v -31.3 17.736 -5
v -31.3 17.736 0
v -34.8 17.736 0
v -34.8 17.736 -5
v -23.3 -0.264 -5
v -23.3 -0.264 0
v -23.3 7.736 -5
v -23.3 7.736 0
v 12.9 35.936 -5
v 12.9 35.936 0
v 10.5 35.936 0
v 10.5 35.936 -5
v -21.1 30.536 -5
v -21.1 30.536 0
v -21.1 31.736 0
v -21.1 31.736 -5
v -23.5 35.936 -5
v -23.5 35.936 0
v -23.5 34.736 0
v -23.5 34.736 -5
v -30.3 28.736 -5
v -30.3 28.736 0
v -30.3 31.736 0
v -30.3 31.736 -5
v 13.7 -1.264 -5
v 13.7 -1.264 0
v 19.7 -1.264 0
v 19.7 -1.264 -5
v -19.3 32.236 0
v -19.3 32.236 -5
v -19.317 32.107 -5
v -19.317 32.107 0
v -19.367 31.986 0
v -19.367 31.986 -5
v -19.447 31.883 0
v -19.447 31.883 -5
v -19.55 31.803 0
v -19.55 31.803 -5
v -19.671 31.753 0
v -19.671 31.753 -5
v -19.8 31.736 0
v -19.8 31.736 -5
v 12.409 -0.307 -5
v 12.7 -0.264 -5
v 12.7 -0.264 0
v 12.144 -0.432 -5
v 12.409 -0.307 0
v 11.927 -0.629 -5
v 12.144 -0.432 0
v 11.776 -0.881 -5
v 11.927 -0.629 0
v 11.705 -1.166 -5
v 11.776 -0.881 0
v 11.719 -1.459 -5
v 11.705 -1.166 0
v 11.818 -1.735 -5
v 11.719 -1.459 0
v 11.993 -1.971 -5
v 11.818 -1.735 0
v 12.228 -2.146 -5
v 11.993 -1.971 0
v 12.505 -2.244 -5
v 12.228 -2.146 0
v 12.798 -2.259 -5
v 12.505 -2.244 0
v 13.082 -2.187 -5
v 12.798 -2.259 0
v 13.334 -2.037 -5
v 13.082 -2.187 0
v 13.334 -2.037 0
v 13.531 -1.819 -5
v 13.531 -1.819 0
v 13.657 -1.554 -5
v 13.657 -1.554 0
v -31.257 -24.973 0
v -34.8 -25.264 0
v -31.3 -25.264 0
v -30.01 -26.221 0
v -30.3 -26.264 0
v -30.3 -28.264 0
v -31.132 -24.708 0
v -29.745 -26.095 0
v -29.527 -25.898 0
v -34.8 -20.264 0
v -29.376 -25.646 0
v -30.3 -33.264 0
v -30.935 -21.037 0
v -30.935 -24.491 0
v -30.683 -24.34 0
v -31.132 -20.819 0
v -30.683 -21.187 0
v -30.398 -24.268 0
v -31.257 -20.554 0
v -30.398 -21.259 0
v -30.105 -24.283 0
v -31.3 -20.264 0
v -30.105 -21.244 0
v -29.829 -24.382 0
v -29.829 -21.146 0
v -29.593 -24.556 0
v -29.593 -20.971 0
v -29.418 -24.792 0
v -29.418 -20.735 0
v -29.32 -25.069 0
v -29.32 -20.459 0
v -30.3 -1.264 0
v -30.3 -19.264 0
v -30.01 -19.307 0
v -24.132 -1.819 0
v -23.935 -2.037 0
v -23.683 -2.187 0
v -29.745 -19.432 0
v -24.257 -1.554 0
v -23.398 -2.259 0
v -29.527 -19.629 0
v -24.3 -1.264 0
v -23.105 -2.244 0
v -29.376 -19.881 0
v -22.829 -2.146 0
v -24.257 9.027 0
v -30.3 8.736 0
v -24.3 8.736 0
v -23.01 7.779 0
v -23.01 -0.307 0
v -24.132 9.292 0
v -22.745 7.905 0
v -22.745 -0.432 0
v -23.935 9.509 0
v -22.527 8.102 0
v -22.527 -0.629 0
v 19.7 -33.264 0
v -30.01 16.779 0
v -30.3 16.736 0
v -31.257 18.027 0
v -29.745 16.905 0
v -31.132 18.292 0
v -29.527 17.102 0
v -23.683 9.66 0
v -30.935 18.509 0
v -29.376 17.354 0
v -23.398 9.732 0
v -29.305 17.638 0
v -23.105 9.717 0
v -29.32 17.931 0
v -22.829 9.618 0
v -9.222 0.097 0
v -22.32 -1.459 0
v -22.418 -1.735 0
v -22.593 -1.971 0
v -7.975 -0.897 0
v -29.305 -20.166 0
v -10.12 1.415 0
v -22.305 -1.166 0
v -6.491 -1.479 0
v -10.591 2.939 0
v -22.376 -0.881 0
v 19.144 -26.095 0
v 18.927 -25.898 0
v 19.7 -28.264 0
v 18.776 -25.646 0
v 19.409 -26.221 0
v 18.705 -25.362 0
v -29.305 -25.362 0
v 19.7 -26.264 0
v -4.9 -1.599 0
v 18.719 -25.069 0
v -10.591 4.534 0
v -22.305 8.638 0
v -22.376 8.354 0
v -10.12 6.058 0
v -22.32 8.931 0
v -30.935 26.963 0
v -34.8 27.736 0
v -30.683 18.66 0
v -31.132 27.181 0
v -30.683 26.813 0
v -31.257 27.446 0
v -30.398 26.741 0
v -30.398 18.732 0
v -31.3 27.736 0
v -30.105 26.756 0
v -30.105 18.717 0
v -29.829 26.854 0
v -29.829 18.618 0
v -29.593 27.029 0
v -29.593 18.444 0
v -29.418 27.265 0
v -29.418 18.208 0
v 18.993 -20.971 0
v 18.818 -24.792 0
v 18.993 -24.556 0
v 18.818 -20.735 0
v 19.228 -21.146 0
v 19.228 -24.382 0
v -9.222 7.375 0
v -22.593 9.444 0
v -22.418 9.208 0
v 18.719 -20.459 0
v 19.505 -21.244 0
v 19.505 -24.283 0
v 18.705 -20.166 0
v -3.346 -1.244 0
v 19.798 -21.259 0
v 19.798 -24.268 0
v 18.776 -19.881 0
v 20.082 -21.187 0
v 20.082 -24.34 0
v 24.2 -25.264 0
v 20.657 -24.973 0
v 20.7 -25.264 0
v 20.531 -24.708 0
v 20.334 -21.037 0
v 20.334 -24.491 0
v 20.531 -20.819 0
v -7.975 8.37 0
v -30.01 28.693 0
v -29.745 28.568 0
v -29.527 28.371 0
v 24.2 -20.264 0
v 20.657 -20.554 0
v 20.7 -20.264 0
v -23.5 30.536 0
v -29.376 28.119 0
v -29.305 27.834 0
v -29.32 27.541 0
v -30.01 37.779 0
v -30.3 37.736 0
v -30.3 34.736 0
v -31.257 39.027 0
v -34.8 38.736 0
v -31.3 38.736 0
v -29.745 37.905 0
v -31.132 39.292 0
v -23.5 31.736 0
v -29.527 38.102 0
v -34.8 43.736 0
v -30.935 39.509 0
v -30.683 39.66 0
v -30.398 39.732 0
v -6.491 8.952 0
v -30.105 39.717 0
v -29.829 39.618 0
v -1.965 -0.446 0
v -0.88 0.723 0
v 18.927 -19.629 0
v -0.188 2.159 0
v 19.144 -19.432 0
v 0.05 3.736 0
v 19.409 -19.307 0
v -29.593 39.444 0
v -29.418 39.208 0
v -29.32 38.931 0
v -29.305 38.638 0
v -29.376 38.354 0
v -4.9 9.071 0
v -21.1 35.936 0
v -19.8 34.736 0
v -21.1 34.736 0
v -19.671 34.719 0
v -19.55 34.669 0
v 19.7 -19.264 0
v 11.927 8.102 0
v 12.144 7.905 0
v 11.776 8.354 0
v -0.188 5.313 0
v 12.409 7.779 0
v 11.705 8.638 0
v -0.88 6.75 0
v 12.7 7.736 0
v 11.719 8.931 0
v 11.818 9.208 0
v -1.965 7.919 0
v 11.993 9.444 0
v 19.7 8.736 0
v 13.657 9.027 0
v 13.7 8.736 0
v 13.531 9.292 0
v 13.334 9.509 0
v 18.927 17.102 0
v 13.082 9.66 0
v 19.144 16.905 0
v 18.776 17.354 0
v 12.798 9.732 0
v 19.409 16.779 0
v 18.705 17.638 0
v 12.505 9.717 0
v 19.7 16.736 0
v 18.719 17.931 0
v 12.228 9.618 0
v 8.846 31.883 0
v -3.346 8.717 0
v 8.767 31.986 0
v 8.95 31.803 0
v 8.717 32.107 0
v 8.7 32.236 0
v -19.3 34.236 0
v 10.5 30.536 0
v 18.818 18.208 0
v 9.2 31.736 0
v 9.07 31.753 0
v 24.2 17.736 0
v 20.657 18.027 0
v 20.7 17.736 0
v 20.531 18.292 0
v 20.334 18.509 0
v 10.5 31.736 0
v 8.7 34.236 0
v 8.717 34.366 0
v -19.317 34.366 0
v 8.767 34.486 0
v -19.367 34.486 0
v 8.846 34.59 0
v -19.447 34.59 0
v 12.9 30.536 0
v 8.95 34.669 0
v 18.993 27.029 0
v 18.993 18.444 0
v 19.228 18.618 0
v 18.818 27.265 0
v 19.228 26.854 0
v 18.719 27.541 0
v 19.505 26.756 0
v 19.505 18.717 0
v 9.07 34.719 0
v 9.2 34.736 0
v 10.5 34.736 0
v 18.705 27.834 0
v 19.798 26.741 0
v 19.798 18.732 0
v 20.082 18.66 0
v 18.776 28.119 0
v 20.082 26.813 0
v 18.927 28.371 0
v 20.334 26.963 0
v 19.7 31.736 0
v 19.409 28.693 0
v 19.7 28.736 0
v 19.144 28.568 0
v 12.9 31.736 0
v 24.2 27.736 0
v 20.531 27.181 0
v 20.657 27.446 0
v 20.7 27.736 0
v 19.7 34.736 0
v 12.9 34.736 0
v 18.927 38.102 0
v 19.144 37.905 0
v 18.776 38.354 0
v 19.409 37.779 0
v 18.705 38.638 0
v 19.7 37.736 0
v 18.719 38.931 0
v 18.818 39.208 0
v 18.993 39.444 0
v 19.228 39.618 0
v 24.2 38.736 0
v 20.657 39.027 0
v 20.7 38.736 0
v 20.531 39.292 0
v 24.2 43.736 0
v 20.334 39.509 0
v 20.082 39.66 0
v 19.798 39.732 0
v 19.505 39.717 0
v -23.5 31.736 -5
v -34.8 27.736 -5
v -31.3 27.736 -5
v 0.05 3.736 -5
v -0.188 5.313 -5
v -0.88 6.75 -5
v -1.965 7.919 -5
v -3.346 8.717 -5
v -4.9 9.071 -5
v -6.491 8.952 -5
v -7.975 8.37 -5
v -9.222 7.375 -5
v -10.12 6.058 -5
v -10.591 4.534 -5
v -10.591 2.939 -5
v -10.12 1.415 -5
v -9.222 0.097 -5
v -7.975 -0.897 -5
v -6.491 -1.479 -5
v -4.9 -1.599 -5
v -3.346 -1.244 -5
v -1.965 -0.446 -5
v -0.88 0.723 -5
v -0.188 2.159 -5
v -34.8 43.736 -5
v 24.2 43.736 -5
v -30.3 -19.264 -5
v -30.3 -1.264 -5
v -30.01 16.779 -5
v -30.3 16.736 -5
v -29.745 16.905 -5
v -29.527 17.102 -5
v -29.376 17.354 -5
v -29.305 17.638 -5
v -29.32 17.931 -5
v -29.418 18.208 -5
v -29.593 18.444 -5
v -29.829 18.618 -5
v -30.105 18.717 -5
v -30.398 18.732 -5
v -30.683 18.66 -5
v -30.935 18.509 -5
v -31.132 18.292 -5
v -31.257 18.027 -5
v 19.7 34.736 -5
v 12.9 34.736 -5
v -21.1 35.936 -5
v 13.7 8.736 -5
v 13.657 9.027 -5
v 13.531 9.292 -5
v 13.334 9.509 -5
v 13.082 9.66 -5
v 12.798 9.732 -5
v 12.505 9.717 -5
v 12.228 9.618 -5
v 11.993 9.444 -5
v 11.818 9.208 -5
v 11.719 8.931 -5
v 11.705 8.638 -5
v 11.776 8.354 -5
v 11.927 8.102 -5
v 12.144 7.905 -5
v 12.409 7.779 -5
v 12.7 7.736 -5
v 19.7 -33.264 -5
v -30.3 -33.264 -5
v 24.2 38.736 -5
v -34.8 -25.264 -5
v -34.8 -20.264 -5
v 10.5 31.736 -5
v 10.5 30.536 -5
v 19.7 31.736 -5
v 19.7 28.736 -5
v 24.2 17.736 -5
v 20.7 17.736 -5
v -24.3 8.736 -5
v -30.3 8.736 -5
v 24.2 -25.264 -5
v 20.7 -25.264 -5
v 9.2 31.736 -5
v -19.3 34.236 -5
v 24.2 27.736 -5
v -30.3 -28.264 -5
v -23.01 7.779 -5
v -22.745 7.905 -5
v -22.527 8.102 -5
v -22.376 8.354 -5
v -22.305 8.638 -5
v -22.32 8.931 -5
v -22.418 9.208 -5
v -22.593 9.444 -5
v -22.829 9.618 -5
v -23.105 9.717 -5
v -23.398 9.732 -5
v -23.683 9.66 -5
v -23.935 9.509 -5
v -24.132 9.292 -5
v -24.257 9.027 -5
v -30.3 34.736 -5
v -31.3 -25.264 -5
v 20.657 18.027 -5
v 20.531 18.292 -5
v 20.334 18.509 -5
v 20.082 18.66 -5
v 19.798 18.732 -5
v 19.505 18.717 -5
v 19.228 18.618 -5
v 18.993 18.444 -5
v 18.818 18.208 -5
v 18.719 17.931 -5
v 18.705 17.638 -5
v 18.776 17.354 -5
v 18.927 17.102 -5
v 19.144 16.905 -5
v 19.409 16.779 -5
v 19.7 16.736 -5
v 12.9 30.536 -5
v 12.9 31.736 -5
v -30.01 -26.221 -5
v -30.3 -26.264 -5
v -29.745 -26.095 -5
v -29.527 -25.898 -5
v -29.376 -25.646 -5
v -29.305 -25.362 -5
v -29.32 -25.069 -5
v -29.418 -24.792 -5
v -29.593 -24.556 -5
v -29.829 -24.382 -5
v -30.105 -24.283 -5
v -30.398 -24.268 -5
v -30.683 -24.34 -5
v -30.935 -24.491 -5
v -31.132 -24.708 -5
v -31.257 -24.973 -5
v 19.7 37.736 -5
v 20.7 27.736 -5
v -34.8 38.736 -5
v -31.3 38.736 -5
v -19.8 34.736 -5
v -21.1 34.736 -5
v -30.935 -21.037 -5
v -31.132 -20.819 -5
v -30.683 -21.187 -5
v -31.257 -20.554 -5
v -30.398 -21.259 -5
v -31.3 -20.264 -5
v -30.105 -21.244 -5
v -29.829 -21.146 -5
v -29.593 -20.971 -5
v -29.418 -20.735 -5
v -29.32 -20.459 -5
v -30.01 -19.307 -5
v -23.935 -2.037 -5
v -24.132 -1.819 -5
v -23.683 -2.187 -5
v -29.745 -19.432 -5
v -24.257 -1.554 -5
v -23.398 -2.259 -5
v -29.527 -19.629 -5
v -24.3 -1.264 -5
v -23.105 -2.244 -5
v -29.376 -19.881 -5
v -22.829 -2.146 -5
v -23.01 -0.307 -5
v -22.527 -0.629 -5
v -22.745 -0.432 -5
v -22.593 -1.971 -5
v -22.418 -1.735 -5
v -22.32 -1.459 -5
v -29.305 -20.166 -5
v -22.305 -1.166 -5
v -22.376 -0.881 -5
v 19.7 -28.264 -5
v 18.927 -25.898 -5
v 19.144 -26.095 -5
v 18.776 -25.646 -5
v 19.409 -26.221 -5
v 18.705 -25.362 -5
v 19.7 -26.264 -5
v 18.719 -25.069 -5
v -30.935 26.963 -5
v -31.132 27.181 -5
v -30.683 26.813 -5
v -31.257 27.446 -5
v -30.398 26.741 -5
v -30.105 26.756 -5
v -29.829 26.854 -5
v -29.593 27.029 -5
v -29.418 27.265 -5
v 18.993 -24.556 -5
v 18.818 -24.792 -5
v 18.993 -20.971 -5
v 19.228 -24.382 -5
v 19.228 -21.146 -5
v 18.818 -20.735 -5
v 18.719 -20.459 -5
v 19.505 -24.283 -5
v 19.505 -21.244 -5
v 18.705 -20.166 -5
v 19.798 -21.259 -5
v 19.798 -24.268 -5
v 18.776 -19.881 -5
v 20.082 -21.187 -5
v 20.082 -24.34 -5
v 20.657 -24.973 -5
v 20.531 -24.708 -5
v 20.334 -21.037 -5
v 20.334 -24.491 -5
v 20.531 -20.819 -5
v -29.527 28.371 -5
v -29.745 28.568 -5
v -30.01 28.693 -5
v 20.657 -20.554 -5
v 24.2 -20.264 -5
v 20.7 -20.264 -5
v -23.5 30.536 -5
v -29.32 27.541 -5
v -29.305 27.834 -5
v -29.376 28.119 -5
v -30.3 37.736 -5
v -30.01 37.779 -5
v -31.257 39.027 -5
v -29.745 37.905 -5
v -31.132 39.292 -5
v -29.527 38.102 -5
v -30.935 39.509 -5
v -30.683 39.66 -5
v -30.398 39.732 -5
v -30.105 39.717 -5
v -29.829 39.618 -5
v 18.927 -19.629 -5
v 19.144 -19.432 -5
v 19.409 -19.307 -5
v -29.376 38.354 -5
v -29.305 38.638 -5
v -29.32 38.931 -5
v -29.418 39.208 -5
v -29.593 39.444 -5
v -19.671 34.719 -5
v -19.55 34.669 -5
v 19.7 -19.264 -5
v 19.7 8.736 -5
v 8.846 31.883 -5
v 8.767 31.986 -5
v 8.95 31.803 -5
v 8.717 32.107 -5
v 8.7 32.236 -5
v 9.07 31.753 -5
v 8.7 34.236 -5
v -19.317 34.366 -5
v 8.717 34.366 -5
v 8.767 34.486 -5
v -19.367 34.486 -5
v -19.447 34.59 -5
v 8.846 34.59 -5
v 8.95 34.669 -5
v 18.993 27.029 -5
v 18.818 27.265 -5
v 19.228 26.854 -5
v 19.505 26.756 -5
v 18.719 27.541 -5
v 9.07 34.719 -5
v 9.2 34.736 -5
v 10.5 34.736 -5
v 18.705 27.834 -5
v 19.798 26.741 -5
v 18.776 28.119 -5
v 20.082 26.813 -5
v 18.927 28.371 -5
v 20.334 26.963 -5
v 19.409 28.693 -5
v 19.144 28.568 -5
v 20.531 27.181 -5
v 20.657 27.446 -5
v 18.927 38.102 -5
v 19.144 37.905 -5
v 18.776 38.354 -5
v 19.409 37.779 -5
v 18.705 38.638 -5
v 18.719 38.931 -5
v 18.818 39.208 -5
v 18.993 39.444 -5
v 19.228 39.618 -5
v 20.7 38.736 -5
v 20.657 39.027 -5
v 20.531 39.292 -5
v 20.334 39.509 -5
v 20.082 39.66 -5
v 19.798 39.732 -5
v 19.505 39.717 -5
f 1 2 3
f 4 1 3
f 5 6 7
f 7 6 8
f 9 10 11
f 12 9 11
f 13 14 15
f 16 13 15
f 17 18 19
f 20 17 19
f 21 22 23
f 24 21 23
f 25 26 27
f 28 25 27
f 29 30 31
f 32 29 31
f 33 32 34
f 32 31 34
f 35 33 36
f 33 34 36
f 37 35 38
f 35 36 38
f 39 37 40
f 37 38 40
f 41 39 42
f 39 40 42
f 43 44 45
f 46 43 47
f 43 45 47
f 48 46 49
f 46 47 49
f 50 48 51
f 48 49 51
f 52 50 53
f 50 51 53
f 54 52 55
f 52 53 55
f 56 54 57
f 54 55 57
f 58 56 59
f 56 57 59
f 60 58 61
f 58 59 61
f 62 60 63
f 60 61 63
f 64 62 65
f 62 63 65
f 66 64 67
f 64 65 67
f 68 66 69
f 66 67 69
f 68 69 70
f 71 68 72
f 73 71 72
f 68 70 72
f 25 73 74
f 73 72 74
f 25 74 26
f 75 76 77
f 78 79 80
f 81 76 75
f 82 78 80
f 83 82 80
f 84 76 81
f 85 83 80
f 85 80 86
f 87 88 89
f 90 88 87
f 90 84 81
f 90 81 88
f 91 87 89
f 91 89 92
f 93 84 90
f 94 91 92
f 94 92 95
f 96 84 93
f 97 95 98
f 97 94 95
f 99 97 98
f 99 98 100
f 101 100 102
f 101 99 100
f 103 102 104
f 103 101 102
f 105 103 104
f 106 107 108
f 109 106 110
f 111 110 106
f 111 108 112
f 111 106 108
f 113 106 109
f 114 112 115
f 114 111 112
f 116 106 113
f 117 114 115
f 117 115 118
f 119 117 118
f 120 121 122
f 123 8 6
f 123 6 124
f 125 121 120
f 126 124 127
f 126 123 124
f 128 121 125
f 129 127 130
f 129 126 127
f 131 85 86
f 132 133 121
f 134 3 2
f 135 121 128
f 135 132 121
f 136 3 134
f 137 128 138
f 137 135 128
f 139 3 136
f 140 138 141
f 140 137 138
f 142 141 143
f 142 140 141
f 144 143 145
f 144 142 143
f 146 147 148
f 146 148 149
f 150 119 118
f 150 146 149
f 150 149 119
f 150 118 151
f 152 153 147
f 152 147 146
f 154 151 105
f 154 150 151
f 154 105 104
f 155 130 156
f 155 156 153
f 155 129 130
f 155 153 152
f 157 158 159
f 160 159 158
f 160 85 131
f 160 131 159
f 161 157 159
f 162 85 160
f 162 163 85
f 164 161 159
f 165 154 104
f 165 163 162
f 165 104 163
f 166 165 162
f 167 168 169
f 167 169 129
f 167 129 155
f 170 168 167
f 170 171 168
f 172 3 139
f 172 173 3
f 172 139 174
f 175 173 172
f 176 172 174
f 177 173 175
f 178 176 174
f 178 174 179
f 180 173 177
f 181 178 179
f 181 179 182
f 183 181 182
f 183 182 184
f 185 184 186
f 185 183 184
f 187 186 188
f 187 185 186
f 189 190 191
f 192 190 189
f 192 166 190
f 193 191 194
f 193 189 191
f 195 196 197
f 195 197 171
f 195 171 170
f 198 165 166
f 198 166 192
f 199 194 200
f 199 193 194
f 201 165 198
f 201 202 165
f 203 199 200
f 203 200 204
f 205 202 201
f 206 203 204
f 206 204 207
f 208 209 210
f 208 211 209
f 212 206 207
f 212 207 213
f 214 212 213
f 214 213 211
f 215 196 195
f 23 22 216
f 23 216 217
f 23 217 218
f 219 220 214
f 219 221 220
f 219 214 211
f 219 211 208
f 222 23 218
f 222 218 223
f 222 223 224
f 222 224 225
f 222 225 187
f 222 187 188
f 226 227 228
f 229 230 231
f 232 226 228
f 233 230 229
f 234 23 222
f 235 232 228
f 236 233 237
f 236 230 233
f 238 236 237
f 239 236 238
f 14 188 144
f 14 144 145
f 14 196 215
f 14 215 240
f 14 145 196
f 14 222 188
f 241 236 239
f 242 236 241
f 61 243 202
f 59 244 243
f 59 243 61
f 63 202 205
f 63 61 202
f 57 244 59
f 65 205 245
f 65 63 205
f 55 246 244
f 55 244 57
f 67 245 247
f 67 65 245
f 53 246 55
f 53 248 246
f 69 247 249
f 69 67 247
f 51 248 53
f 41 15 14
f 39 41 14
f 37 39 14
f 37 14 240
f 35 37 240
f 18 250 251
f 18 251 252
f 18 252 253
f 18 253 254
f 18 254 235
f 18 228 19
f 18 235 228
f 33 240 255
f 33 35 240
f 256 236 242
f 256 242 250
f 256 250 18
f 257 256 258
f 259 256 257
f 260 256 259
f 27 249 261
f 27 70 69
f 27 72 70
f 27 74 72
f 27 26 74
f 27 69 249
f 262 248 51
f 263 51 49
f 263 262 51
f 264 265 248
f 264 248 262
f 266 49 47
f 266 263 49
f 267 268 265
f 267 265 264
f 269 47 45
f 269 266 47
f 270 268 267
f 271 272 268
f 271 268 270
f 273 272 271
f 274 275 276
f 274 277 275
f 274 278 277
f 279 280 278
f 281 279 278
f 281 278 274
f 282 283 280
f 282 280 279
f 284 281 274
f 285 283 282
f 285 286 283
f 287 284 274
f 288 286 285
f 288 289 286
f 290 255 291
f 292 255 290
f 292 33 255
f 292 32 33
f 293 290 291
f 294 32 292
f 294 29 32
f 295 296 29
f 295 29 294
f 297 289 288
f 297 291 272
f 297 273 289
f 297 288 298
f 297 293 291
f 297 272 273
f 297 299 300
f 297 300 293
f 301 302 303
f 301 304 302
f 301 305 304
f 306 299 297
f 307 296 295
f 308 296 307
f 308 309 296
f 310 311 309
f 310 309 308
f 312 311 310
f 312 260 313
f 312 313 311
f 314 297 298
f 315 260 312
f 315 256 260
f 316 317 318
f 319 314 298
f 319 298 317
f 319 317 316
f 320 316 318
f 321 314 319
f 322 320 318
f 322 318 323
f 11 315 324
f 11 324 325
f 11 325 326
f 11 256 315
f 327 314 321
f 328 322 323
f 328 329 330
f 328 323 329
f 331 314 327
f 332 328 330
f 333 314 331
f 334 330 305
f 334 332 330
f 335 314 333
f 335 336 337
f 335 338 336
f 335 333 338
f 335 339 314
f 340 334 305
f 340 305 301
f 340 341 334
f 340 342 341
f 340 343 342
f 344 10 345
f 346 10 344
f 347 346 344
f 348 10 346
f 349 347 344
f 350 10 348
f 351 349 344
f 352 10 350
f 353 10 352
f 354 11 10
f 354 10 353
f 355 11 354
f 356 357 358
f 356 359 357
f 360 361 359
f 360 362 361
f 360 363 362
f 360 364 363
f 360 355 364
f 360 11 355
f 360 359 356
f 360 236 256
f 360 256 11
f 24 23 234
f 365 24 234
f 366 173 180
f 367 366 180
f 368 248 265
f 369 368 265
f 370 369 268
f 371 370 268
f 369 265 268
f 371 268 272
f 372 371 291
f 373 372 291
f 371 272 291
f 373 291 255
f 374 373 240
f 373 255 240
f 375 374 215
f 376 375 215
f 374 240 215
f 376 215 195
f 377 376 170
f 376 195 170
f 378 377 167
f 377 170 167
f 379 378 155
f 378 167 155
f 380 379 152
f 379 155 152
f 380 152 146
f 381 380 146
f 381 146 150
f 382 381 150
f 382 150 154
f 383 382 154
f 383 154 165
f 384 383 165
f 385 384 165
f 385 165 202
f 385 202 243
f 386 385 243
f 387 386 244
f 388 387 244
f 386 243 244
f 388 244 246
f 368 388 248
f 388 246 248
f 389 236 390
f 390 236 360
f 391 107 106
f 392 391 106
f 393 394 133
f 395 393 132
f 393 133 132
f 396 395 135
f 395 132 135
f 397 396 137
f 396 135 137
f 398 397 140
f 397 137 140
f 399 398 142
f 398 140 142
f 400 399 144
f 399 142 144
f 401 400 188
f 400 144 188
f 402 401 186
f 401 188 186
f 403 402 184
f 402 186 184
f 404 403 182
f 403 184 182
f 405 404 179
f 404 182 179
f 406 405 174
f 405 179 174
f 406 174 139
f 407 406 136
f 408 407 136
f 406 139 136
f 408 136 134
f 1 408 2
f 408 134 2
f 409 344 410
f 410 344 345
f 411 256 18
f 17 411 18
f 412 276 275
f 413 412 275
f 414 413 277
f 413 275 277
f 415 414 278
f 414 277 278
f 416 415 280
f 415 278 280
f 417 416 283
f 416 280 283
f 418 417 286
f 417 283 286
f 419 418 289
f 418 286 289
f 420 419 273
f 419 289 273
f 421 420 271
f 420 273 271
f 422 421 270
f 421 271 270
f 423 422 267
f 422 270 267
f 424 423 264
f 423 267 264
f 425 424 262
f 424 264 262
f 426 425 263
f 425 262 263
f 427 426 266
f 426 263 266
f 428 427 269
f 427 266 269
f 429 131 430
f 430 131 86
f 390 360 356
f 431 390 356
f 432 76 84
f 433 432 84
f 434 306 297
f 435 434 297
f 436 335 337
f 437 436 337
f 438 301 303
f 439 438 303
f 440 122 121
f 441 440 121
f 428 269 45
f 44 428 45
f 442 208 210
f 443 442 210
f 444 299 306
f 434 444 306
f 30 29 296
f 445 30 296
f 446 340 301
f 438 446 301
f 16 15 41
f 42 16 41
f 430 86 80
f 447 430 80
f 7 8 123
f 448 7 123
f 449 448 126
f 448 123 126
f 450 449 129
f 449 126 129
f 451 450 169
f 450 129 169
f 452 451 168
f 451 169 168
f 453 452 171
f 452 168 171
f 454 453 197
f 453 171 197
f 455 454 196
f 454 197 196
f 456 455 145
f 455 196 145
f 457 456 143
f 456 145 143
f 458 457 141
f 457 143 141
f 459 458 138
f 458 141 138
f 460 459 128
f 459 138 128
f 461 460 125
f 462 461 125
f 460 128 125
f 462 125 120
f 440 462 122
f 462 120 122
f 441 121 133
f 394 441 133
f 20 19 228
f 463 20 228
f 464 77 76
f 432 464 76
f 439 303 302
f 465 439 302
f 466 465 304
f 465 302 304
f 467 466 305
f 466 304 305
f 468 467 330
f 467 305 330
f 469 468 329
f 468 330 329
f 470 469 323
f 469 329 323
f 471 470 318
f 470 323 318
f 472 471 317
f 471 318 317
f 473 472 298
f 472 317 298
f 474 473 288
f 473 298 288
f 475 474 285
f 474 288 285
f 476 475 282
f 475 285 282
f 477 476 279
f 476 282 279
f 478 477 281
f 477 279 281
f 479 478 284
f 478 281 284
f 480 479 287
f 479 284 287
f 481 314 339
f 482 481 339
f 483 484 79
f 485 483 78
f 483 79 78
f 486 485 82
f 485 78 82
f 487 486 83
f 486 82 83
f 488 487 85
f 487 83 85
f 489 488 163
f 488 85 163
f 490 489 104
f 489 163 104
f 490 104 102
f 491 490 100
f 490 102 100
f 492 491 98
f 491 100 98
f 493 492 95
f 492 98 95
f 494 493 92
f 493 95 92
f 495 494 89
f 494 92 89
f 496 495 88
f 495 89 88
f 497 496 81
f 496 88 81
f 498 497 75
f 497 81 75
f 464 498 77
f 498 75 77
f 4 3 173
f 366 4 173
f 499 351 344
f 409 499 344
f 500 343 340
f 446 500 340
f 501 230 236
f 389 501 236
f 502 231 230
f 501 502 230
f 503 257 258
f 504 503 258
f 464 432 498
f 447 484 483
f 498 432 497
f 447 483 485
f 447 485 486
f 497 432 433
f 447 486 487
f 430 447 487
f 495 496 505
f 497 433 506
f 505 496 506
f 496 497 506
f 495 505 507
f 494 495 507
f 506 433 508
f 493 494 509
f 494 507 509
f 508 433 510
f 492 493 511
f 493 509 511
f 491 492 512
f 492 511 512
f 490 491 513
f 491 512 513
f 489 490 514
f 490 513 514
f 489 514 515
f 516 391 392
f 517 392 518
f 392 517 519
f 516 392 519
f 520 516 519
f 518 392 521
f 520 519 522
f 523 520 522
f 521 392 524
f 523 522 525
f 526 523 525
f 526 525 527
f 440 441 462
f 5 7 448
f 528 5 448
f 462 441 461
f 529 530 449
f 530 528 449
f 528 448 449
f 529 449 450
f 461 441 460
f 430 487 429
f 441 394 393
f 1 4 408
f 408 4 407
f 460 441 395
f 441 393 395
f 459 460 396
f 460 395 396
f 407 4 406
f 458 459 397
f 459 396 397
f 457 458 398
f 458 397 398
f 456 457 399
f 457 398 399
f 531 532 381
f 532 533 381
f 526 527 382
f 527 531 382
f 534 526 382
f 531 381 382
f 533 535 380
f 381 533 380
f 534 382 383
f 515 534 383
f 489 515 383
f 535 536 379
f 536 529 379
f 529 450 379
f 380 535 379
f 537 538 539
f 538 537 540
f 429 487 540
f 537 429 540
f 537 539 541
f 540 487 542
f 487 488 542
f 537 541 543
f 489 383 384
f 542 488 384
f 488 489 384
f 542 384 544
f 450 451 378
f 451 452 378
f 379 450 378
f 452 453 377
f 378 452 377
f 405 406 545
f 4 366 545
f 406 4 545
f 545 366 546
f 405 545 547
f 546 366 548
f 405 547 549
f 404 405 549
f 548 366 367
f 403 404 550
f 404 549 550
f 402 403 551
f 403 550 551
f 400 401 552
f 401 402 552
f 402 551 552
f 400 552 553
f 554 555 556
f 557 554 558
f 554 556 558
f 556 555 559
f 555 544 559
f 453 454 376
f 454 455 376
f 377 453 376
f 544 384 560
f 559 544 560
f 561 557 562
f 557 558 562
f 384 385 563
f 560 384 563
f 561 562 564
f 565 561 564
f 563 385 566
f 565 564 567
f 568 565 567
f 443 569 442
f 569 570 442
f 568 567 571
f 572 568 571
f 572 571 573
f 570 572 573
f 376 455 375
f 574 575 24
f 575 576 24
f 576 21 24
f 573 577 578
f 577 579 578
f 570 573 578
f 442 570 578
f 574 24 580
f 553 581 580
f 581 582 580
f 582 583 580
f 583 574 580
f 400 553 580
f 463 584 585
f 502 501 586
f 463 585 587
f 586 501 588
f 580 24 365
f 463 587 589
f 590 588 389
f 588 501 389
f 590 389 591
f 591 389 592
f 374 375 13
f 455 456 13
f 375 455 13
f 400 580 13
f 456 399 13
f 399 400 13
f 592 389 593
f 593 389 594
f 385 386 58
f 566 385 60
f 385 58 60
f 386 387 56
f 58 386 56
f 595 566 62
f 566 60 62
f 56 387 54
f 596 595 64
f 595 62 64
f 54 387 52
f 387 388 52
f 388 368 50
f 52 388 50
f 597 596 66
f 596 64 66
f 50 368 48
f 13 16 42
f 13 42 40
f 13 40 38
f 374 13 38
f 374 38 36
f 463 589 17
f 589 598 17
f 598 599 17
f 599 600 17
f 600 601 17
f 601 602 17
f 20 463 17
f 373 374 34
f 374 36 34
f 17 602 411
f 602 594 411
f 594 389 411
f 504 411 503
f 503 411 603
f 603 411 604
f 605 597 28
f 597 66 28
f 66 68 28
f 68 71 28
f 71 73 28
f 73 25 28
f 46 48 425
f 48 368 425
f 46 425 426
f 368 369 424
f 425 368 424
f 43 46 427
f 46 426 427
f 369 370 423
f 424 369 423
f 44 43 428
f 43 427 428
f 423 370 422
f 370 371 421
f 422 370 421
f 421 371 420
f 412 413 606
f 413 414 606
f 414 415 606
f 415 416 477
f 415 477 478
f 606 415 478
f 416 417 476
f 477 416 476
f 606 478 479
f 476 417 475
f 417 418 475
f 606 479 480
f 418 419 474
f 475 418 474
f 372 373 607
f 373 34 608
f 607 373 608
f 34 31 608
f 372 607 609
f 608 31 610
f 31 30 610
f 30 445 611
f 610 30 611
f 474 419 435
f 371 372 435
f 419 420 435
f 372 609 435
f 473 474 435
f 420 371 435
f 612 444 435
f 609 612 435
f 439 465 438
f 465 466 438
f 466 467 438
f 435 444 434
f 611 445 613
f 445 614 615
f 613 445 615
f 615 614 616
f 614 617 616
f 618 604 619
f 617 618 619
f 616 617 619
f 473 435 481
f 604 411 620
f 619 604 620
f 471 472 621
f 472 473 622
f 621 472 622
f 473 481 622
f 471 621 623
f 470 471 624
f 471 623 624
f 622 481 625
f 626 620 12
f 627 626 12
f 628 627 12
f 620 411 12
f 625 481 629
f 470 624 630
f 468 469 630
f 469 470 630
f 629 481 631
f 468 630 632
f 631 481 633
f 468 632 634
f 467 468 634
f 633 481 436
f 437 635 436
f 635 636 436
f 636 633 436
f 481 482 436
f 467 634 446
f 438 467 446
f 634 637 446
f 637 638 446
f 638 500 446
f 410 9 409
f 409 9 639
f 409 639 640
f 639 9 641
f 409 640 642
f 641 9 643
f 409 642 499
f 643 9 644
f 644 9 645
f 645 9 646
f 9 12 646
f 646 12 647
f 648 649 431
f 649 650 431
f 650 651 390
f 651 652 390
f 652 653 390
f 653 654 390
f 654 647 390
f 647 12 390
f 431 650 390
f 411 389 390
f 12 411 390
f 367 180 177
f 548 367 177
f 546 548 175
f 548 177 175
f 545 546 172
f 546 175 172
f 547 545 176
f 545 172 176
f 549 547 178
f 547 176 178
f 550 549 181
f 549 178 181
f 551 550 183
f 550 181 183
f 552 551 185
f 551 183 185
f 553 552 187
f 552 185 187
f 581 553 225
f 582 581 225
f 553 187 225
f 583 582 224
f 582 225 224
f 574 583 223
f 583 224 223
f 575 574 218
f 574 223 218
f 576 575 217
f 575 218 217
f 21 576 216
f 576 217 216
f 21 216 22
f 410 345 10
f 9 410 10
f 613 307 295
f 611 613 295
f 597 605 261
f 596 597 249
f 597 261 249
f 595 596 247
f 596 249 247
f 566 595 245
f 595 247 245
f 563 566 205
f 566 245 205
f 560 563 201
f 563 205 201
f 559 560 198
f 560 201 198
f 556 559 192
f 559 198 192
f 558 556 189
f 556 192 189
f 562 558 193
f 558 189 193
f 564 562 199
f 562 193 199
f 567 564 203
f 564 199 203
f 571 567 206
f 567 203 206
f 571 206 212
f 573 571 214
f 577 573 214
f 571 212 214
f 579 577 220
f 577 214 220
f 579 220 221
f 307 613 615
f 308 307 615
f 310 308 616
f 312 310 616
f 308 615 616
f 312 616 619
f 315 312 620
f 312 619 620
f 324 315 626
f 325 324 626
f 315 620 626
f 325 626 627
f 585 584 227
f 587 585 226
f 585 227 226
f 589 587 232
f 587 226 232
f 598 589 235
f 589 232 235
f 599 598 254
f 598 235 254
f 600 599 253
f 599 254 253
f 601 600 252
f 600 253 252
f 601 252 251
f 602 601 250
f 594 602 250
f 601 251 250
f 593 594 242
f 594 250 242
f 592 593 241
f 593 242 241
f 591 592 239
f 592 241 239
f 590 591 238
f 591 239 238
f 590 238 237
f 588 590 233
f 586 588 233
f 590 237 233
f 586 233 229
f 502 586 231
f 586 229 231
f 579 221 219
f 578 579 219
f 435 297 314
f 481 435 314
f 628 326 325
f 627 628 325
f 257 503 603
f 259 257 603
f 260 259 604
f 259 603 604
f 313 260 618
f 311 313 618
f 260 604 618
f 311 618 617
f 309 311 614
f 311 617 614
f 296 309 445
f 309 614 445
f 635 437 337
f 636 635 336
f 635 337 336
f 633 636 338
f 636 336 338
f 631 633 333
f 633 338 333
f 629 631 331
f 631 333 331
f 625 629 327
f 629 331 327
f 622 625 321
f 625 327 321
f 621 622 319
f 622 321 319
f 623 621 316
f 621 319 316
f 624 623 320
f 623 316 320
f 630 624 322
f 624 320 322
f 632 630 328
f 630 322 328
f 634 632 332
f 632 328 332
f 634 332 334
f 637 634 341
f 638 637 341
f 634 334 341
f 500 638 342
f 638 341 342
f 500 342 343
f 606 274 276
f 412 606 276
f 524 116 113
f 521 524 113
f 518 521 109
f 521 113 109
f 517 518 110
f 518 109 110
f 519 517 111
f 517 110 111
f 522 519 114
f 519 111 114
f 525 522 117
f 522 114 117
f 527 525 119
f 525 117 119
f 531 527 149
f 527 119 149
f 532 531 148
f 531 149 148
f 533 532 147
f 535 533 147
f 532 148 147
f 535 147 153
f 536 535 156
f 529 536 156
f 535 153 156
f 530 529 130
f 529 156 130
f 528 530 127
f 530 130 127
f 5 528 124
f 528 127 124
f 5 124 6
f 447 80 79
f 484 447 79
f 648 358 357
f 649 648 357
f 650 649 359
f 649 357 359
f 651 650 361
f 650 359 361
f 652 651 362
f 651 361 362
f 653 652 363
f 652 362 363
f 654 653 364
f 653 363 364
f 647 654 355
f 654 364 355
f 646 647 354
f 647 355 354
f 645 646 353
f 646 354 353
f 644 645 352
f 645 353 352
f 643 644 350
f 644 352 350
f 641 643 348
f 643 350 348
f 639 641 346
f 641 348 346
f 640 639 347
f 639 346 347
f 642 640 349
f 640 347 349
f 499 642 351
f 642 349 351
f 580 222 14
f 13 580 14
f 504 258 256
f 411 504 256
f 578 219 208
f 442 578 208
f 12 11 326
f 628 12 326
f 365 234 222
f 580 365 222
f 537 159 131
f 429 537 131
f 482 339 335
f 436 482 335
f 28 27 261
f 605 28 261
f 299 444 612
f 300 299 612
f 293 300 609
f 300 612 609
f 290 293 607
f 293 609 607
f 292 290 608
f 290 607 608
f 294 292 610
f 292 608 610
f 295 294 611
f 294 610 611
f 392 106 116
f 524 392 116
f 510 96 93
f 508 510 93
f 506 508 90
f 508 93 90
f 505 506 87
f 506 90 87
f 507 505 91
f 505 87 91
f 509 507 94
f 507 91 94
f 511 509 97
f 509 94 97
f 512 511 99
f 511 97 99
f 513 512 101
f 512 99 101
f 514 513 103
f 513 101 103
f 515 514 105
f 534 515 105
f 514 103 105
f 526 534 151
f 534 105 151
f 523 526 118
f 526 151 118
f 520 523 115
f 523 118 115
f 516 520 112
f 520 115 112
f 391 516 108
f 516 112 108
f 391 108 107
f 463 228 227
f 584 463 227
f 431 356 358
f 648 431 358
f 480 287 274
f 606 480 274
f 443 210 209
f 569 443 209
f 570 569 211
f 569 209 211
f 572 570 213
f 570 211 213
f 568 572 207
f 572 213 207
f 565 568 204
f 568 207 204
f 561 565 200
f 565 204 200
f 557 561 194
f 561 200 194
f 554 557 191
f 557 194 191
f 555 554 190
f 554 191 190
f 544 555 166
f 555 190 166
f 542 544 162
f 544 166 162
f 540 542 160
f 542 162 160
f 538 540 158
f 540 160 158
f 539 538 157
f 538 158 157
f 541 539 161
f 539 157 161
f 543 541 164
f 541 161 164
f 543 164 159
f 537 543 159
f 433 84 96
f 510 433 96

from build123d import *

# Parameters (mm, degrees)
ESBO_O1_R             = 5.35
FLANGE_BASE1_DEPTH    = 5
CORTE_EXTRUS_O1_REACH = 58.115
ESBO_O2_R             = 1
QUEBRA_CANTO1_START   = -5
QUEBRA_CANTO1_DEPTH   = 5


# Read off the part's stored shape, not the designer's step: Quebra-Canto1
# Sheet-metal steps are written as plain solids
with BuildPart() as part:
    # Esboço1 → Flange-base1 (new body)
    with BuildSketch(Plane.XY):
        Polygon((19.699698823, 8.736399513), (12.699698794, 8.736399513), (12.699698794, -1.263600636), (19.699698823, -1.263600636), (19.699698823, -20.26360068), (24.199698913, -20.26360068), (24.199698913, -25.263600799), (19.699698982, -25.263600562), (19.699698823, -28.263600308), (19.699698823, -33.263600919), (-30.300301832, -33.263600919), (-30.300301832, -28.263600308), (-30.30030199, -25.263600562), (-34.800301922, -25.263600799), (-34.800301922, -20.26360068), (-30.300301832, -20.26360068), (-30.300301832, -1.263600636), (-23.300301802, -1.263600636), (-23.300301802, 8.736399513), (-30.300301832, 8.736399513), (-30.300301832, 17.736399558), (-34.800301922, 17.736399558), (-34.800301922, 27.736399558), (-30.300301832, 27.736399558), (-30.300301832, 31.736399692), (-23.500301773, 31.736399692), (-23.500301773, 30.536399744), (-21.100301772, 30.536399744), (-21.100301772, 31.736399692), (-19.300301772, 31.736399692), (-19.300301772, 34.736399796), (-21.100301772, 34.736399796), (-21.100301772, 35.936399744), (-23.500301772, 35.936399744), (-23.500301772, 34.736399796), (-30.300301832, 34.736399796), (-30.300301832, 38.736399796), (-34.800301832, 38.736399796), (-34.800301832, 43.736399796), (24.199698817, 43.736399796), (24.199698817, 38.736399797), (19.699698817, 38.736399797), (19.699698817, 34.736399797), (12.899698227, 34.736399797), (12.899698227, 35.936399744), (10.499698227, 35.936399744), (10.499698227, 34.736399797), (8.699698168, 34.736399797), (8.699698168, 31.736399692), (10.499698227, 31.736399692), (10.499698227, 30.536399751), (12.899698233, 30.536399751), (12.899698233, 31.736399692), (19.699698823, 31.736399692), (19.699698823, 27.736399558), (24.199698913, 27.736399558), (24.199698913, 17.736399558), (19.699698823, 17.736399558), align=None)
        with Locations((-5.300301504, 3.736399439)):
            Circle(ESBO_O1_R, mode=Mode.SUBTRACT)
    extrude(amount=-FLANGE_BASE1_DEPTH)

    # Esboço2 → Corte-extrusão1 (cut, up to next)
    with BuildSketch(Plane.XY, mode=Mode.PRIVATE) as corte_extrus_o1_sk1:
        with Locations((-30.300301832, 38.736399796)):
            Circle(ESBO_O2_R)
    corte_extrus_o1_tool1 = extrude(corte_extrus_o1_sk1.sketch, amount=-CORTE_EXTRUS_O1_REACH, mode=Mode.PRIVATE) & part.part
    # Esboço2 → Corte-extrusão1 (cut, up to next)
    with BuildSketch(Plane.XY, mode=Mode.PRIVATE) as corte_extrus_o1_sk2:
        with Locations((-30.300301832, 27.736399558)):
            Circle(ESBO_O2_R)
    corte_extrus_o1_tool2 = extrude(corte_extrus_o1_sk2.sketch, amount=-CORTE_EXTRUS_O1_REACH, mode=Mode.PRIVATE) & part.part
    # Esboço2 → Corte-extrusão1 (cut, up to next)
    with BuildSketch(Plane.XY, mode=Mode.PRIVATE) as corte_extrus_o1_sk3:
        with Locations((-30.300301832, 17.736399558)):
            Circle(ESBO_O2_R)
    corte_extrus_o1_tool3 = extrude(corte_extrus_o1_sk3.sketch, amount=-CORTE_EXTRUS_O1_REACH, mode=Mode.PRIVATE) & part.part
    # Esboço2 → Corte-extrusão1 (cut, up to next)
    with BuildSketch(Plane.XY, mode=Mode.PRIVATE) as corte_extrus_o1_sk4:
        with Locations((-23.300301802, 8.736399513)):
            Circle(ESBO_O2_R)
    corte_extrus_o1_tool4 = extrude(corte_extrus_o1_sk4.sketch, amount=-CORTE_EXTRUS_O1_REACH, mode=Mode.PRIVATE) & part.part
    # Esboço2 → Corte-extrusão1 (cut, up to next)
    with BuildSketch(Plane.XY, mode=Mode.PRIVATE) as corte_extrus_o1_sk5:
        with Locations((-23.300301802, -1.263600636)):
            Circle(ESBO_O2_R)
    corte_extrus_o1_tool5 = extrude(corte_extrus_o1_sk5.sketch, amount=-CORTE_EXTRUS_O1_REACH, mode=Mode.PRIVATE) & part.part
    # Esboço2 → Corte-extrusão1 (cut, up to next)
    with BuildSketch(Plane.XY, mode=Mode.PRIVATE) as corte_extrus_o1_sk6:
        with Locations((-30.300301832, -20.26360068)):
            Circle(ESBO_O2_R)
    corte_extrus_o1_tool6 = extrude(corte_extrus_o1_sk6.sketch, amount=-CORTE_EXTRUS_O1_REACH, mode=Mode.PRIVATE) & part.part
    # Esboço2 → Corte-extrusão1 (cut, up to next)
    with BuildSketch(Plane.XY, mode=Mode.PRIVATE) as corte_extrus_o1_sk7:
        with Locations((-30.30030199, -25.263600562)):
            Circle(ESBO_O2_R)
    corte_extrus_o1_tool7 = extrude(corte_extrus_o1_sk7.sketch, amount=-CORTE_EXTRUS_O1_REACH, mode=Mode.PRIVATE) & part.part
    # Esboço2 → Corte-extrusão1 (cut, up to next)
    with BuildSketch(Plane.XY, mode=Mode.PRIVATE) as corte_extrus_o1_sk8:
        with Locations((19.699698982, -25.263600562)):
            Circle(ESBO_O2_R)
    corte_extrus_o1_tool8 = extrude(corte_extrus_o1_sk8.sketch, amount=-CORTE_EXTRUS_O1_REACH, mode=Mode.PRIVATE) & part.part
    # Esboço2 → Corte-extrusão1 (cut, up to next)
    with BuildSketch(Plane.XY, mode=Mode.PRIVATE) as corte_extrus_o1_sk9:
        with Locations((19.699698823, -20.26360068)):
            Circle(ESBO_O2_R)
    corte_extrus_o1_tool9 = extrude(corte_extrus_o1_sk9.sketch, amount=-CORTE_EXTRUS_O1_REACH, mode=Mode.PRIVATE) & part.part
    # Esboço2 → Corte-extrusão1 (cut, up to next)
    with BuildSketch(Plane.XY, mode=Mode.PRIVATE) as corte_extrus_o1_sk10:
        with Locations((12.699698794, 8.736399513)):
            Circle(ESBO_O2_R)
    corte_extrus_o1_tool10 = extrude(corte_extrus_o1_sk10.sketch, amount=-CORTE_EXTRUS_O1_REACH, mode=Mode.PRIVATE) & part.part
    # Esboço2 → Corte-extrusão1 (cut, up to next)
    with BuildSketch(Plane.XY, mode=Mode.PRIVATE) as corte_extrus_o1_sk11:
        with Locations((12.699698794, -1.263600636)):
            Circle(ESBO_O2_R)
    corte_extrus_o1_tool11 = extrude(corte_extrus_o1_sk11.sketch, amount=-CORTE_EXTRUS_O1_REACH, mode=Mode.PRIVATE) & part.part
    # Esboço2 → Corte-extrusão1 (cut, up to next)
    with BuildSketch(Plane.XY, mode=Mode.PRIVATE) as corte_extrus_o1_sk12:
        with Locations((19.699698823, 17.736399558)):
            Circle(ESBO_O2_R)
    corte_extrus_o1_tool12 = extrude(corte_extrus_o1_sk12.sketch, amount=-CORTE_EXTRUS_O1_REACH, mode=Mode.PRIVATE) & part.part
    # Esboço2 → Corte-extrusão1 (cut, up to next)
    with BuildSketch(Plane.XY, mode=Mode.PRIVATE) as corte_extrus_o1_sk13:
        with Locations((19.699698817, 38.736399797)):
            Circle(ESBO_O2_R)
    corte_extrus_o1_tool13 = extrude(corte_extrus_o1_sk13.sketch, amount=-CORTE_EXTRUS_O1_REACH, mode=Mode.PRIVATE) & part.part
    # Esboço2 → Corte-extrusão1 (cut, up to next)
    with BuildSketch(Plane.XY, mode=Mode.PRIVATE) as corte_extrus_o1_sk14:
        with Locations((19.699698823, 27.736399558)):
            Circle(ESBO_O2_R)
    corte_extrus_o1_tool14 = extrude(corte_extrus_o1_sk14.sketch, amount=-CORTE_EXTRUS_O1_REACH, mode=Mode.PRIVATE) & part.part
    add(corte_extrus_o1_tool1.solids().sort_by_distance((-30.300302, 38.7364, 0))[0], mode=Mode.SUBTRACT)
    add(corte_extrus_o1_tool2.solids().sort_by_distance((-30.300302, 27.7364, 0))[0], mode=Mode.SUBTRACT)
    add(corte_extrus_o1_tool3.solids().sort_by_distance((-30.300302, 17.7364, 0))[0], mode=Mode.SUBTRACT)
    add(corte_extrus_o1_tool4.solids().sort_by_distance((-23.300302, 8.7364, 0))[0], mode=Mode.SUBTRACT)
    add(corte_extrus_o1_tool5.solids().sort_by_distance((-23.300302, -1.263601, 0))[0], mode=Mode.SUBTRACT)
    add(corte_extrus_o1_tool6.solids().sort_by_distance((-30.300302, -20.263601, 0))[0], mode=Mode.SUBTRACT)
    add(corte_extrus_o1_tool7.solids().sort_by_distance((-30.300302, -25.263601, 0))[0], mode=Mode.SUBTRACT)
    add(corte_extrus_o1_tool8.solids().sort_by_distance((19.699699, -25.263601, 0))[0], mode=Mode.SUBTRACT)
    add(corte_extrus_o1_tool9.solids().sort_by_distance((19.699699, -20.263601, 0))[0], mode=Mode.SUBTRACT)
    add(corte_extrus_o1_tool10.solids().sort_by_distance((12.699699, 8.7364, 0))[0], mode=Mode.SUBTRACT)
    add(corte_extrus_o1_tool11.solids().sort_by_distance((12.699699, -1.263601, 0))[0], mode=Mode.SUBTRACT)
    add(corte_extrus_o1_tool12.solids().sort_by_distance((19.699699, 17.7364, 0))[0], mode=Mode.SUBTRACT)
    add(corte_extrus_o1_tool13.solids().sort_by_distance((19.699699, 38.7364, 0))[0], mode=Mode.SUBTRACT)
    add(corte_extrus_o1_tool14.solids().sort_by_distance((19.699699, 27.7364, 0))[0], mode=Mode.SUBTRACT)

    # Quebra-Canto1 outline → Quebra-Canto1 (add)
    with BuildSketch(Plane.XY.offset(QUEBRA_CANTO1_START)):
        with BuildLine():
            Line((8.699698168, 34.736399797), (8.699698168, 34.236399797))
            ThreePointArc((8.699698168, 34.236399797), (8.846144777, 34.589953188), (9.199698168, 34.736399797))
            Line((9.199698168, 34.736399797), (8.699698168, 34.736399797))
        make_face()
        with BuildLine():
            ThreePointArc((9.199698168, 31.736399692), (8.846144777, 31.882846301), (8.699698168, 32.236399692))
            Line((8.699698168, 32.236399692), (8.699698168, 31.736399692))
            Line((8.699698168, 31.736399692), (9.199698168, 31.736399692))
        make_face()
        with BuildLine():
            Line((-19.300301772, 31.736399692), (-19.300301772, 32.236399692))
            ThreePointArc((-19.300301772, 32.236399692), (-19.446748382, 31.882846301), (-19.800301772, 31.736399692))
            Line((-19.800301772, 31.736399692), (-19.300301772, 31.736399692))
        make_face()
        with BuildLine():
            ThreePointArc((-19.800301772, 34.736399796), (-19.446748382, 34.589953186), (-19.300301772, 34.236399796))
            Line((-19.300301772, 34.236399796), (-19.300301772, 34.736399796))
            Line((-19.300301772, 34.736399796), (-19.800301772, 34.736399796))
        make_face()
    extrude(amount=QUEBRA_CANTO1_DEPTH)


solid = part.part
